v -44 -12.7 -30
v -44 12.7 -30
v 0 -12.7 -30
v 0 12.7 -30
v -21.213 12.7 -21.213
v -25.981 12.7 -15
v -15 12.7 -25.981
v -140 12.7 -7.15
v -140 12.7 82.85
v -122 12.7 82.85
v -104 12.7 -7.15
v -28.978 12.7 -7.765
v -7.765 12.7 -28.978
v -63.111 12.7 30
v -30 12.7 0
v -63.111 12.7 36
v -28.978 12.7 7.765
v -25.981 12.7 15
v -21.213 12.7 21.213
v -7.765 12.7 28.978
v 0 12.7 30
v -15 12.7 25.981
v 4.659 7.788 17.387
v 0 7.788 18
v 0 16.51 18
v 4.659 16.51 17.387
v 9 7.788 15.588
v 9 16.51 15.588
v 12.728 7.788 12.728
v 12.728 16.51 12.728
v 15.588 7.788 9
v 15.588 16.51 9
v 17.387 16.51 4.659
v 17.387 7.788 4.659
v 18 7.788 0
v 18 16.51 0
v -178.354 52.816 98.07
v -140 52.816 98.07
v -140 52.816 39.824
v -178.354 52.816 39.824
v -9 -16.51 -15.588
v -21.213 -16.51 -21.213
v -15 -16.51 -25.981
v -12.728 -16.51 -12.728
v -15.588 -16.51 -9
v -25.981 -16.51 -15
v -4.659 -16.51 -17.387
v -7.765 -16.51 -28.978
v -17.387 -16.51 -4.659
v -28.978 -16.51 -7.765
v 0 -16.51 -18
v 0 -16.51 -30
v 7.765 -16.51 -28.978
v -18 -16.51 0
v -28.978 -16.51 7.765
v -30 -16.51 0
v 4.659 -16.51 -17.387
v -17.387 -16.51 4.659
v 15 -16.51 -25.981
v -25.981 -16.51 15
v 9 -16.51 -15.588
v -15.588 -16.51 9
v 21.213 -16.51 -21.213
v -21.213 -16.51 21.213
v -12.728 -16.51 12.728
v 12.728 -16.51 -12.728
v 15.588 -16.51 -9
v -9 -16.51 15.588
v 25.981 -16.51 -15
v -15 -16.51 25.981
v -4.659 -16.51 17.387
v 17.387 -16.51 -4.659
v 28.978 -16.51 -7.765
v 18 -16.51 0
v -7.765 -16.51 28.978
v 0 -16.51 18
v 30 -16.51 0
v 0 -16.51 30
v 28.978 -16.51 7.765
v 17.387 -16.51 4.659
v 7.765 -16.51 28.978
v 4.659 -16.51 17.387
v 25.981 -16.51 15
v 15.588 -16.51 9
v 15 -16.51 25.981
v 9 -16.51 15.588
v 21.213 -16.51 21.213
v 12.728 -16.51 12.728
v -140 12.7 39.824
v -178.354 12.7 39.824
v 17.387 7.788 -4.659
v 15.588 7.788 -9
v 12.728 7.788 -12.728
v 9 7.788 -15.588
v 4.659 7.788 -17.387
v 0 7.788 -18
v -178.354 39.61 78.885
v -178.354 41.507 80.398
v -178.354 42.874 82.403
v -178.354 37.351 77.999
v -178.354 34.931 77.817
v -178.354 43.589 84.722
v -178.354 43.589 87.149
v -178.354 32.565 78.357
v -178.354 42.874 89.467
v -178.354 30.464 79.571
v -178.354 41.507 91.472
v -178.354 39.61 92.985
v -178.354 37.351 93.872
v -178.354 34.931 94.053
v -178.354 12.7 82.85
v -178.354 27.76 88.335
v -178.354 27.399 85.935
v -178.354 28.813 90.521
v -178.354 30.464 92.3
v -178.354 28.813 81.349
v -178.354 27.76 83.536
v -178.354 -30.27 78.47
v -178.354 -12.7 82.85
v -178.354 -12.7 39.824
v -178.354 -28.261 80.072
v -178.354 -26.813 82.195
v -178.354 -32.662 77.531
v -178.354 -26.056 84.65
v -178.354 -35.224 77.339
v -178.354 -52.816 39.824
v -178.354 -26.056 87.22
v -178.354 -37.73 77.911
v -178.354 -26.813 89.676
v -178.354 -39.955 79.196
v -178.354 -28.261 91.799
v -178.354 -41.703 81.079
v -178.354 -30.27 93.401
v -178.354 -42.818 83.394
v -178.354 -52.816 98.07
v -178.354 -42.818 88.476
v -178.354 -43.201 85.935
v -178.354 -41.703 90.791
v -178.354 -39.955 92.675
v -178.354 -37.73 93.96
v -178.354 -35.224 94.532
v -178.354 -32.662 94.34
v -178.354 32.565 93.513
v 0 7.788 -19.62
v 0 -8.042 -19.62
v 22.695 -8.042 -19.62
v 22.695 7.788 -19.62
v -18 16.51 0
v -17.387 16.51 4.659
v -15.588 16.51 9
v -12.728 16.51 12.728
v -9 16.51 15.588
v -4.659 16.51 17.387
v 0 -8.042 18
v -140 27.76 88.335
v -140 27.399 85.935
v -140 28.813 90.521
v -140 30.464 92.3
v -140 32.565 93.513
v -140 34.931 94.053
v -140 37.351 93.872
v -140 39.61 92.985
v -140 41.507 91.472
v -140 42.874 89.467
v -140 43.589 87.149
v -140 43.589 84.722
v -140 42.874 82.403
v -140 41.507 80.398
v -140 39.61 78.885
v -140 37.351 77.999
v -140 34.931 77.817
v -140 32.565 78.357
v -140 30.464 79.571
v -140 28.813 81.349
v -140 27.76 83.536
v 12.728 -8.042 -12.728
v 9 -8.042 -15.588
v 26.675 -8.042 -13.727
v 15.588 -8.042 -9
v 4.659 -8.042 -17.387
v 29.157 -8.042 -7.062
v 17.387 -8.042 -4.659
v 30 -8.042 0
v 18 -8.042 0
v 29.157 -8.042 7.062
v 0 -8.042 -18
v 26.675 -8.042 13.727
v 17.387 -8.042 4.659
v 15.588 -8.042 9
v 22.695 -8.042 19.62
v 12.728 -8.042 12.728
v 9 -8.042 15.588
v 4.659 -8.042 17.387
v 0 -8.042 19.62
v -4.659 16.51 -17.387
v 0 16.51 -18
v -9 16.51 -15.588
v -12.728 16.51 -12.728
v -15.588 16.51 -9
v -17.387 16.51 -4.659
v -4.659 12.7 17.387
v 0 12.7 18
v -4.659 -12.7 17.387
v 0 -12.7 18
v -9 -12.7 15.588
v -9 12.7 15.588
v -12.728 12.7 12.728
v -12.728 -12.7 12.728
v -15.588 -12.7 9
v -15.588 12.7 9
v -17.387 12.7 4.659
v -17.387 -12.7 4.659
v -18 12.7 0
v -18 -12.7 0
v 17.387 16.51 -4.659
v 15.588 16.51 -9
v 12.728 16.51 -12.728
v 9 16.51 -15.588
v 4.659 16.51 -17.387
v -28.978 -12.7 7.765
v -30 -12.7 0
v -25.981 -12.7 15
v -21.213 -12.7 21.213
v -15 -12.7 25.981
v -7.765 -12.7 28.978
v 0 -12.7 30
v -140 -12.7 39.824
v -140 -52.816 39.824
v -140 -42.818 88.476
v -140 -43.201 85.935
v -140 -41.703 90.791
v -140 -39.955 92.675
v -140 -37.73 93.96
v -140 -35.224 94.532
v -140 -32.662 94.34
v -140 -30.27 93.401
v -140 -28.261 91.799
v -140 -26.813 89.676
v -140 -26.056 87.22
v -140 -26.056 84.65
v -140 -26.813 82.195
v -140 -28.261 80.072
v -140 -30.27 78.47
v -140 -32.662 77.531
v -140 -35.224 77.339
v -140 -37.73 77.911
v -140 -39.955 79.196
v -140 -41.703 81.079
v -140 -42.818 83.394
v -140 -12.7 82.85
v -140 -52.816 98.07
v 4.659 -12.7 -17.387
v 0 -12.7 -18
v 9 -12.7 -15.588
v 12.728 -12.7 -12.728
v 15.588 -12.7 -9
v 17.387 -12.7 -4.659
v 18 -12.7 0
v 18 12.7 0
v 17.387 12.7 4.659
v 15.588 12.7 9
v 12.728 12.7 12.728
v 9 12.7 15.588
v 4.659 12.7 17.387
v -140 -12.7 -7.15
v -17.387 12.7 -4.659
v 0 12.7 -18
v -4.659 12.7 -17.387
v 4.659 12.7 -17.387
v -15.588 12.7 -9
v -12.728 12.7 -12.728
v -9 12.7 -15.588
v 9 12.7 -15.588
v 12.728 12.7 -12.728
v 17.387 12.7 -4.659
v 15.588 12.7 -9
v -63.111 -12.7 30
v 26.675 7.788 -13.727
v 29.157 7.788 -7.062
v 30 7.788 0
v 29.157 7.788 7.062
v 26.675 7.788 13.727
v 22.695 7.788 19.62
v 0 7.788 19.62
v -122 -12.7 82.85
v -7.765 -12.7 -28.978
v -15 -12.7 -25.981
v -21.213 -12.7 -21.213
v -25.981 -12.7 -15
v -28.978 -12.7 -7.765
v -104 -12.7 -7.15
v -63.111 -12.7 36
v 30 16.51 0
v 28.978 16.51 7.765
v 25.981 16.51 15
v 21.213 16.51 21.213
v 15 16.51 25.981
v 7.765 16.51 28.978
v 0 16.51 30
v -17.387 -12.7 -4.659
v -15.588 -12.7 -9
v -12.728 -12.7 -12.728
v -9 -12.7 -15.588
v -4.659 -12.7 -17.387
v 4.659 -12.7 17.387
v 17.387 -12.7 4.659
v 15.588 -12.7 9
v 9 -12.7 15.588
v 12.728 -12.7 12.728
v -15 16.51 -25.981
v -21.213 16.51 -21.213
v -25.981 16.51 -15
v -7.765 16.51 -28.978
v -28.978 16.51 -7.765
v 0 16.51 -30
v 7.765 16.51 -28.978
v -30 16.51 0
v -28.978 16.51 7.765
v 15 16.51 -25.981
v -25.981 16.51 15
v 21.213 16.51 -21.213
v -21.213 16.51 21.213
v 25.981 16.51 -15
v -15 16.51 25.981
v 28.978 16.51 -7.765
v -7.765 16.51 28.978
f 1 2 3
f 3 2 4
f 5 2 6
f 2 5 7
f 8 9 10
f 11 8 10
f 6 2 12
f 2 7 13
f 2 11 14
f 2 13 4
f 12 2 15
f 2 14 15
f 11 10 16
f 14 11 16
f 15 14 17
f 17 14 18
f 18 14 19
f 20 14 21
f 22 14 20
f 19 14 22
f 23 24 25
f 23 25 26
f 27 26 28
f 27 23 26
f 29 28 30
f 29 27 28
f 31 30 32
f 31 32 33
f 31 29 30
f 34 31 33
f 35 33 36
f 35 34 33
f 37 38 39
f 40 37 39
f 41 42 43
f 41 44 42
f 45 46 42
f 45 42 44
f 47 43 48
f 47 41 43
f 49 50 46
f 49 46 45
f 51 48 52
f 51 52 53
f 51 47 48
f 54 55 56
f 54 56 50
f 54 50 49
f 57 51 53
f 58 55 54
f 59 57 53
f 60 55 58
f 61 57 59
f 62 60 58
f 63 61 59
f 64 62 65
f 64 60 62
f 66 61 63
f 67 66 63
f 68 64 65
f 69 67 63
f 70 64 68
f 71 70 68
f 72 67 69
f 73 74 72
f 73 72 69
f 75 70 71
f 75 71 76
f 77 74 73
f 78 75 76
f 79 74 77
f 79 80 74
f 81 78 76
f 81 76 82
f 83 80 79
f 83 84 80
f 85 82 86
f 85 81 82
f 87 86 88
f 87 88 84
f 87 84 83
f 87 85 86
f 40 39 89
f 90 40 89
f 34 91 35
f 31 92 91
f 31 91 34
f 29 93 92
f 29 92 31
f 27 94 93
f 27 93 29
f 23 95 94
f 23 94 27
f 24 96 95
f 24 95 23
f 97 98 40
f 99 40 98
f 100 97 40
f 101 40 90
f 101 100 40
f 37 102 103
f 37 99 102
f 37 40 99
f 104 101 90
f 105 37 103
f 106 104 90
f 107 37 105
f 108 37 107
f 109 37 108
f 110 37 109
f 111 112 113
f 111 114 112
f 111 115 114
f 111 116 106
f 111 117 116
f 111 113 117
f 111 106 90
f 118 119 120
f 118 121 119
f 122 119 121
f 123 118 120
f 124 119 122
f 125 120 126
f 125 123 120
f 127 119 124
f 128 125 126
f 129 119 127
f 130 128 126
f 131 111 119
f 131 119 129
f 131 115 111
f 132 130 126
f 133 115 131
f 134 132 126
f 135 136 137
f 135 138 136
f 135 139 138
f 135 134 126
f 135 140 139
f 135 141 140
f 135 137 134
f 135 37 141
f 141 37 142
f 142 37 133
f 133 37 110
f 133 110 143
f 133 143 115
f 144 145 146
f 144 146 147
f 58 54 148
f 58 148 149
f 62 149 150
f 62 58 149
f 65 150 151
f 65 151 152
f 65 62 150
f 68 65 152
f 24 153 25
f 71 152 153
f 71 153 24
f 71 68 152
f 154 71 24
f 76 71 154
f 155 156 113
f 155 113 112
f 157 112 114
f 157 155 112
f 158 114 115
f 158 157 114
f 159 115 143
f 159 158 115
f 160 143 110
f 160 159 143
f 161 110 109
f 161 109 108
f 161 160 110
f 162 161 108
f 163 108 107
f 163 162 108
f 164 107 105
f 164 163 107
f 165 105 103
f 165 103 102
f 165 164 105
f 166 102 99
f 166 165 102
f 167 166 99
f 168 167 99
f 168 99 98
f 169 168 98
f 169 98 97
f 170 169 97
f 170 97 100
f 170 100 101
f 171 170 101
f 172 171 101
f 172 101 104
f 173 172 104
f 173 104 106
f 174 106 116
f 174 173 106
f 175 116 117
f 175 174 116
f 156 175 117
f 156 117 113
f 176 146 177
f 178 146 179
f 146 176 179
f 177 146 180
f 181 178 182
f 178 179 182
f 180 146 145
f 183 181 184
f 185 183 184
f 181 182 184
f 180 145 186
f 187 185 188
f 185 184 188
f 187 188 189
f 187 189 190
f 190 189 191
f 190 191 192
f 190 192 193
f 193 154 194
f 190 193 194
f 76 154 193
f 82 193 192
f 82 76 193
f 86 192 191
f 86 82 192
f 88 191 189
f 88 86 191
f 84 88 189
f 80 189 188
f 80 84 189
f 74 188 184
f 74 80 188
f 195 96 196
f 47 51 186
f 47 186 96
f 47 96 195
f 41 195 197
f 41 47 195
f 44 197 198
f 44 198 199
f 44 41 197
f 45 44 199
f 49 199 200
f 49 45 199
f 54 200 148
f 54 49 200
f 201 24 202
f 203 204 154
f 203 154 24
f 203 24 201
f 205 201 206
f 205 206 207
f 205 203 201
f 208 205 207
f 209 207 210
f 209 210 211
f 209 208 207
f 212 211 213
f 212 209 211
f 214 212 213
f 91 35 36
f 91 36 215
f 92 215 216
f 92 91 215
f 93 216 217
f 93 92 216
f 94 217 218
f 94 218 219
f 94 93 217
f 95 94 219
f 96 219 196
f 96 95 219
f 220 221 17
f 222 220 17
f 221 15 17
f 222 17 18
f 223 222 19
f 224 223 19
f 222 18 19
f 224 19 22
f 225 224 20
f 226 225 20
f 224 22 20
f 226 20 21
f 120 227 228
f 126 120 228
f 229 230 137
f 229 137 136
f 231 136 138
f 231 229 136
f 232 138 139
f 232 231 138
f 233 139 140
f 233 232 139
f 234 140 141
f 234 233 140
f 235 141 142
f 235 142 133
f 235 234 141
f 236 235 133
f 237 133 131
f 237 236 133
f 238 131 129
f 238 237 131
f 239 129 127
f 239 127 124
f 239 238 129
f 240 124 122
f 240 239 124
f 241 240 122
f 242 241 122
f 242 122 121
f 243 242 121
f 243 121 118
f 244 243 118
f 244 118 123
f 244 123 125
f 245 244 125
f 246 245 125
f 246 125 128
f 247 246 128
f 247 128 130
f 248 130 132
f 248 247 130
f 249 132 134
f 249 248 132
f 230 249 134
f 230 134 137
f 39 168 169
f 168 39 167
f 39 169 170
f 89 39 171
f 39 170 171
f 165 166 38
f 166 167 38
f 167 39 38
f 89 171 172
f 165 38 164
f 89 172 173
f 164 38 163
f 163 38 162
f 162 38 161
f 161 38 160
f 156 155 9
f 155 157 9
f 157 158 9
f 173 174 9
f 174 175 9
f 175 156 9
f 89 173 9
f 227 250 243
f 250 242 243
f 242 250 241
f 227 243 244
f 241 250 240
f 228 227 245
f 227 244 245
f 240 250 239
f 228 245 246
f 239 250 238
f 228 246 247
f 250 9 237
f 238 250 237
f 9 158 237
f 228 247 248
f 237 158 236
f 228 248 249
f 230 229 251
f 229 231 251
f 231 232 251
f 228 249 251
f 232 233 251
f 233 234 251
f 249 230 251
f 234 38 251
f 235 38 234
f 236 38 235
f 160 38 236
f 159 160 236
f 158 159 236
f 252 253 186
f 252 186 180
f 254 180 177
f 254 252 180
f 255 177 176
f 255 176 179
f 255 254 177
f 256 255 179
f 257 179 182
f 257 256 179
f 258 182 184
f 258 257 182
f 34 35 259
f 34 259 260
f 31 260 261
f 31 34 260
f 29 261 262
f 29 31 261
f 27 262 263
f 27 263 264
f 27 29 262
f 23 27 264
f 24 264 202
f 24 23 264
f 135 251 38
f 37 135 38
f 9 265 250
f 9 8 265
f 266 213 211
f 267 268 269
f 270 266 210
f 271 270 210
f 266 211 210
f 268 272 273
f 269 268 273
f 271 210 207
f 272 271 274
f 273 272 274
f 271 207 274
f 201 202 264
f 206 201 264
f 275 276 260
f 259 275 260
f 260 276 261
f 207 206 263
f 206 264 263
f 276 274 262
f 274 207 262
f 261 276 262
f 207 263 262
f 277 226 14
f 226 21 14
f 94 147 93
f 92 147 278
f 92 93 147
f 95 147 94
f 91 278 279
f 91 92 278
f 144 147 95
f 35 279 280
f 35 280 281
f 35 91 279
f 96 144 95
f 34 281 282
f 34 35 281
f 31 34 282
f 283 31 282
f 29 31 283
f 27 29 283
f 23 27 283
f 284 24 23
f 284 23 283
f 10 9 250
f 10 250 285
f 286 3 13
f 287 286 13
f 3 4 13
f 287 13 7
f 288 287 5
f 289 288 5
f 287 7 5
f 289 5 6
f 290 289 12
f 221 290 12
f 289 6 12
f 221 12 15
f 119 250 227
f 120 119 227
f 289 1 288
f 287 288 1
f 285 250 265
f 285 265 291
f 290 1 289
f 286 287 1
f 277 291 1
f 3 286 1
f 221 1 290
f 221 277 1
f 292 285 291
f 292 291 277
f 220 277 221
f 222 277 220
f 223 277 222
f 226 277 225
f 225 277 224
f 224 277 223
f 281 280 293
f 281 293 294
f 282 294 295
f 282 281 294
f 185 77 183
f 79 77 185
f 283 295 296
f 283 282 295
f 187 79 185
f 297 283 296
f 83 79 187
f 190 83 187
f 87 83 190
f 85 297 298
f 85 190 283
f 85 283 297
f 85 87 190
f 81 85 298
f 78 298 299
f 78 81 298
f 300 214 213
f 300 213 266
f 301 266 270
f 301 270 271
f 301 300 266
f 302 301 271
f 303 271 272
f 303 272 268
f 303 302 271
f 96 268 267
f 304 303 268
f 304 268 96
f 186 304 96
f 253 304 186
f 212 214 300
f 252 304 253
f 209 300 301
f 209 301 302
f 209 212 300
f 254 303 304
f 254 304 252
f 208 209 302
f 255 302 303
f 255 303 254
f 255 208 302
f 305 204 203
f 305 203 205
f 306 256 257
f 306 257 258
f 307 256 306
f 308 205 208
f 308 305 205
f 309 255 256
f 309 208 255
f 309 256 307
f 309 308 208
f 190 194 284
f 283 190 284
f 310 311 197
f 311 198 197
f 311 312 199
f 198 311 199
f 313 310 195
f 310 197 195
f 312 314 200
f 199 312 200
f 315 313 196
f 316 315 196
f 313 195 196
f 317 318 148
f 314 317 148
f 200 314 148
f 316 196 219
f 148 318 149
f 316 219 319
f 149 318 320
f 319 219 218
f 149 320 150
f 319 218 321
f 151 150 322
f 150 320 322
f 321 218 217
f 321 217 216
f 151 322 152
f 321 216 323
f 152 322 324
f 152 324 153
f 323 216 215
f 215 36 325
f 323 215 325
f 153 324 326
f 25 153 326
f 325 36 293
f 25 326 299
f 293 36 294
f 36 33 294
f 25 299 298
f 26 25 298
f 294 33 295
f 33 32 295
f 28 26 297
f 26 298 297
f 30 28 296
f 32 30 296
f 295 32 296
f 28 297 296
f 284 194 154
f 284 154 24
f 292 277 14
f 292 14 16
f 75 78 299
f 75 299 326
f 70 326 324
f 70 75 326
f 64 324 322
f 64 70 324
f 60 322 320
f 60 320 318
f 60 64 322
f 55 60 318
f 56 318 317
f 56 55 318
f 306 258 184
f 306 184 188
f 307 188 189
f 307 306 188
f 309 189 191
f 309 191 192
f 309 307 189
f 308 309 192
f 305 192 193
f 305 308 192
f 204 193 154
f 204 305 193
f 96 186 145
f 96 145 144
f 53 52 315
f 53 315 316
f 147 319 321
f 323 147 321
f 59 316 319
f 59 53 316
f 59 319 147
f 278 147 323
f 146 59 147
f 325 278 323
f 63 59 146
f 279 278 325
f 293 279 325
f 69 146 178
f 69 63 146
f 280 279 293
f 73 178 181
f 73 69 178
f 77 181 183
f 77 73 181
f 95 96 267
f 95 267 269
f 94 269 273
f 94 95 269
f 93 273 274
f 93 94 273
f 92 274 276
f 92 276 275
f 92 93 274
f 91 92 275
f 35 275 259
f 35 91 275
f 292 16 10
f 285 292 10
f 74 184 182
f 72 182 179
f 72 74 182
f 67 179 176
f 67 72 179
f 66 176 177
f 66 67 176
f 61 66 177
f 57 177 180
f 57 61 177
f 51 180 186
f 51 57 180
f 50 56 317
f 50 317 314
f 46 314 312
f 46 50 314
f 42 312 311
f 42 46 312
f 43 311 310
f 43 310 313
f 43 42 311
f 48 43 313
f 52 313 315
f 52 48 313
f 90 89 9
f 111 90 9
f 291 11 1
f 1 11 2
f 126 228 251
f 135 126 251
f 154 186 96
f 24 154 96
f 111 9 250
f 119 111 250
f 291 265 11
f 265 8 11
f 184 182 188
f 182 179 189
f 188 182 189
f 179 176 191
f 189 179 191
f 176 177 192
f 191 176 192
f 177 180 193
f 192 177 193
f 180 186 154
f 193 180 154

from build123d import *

# Parameters (mm, degrees)
F0_W     = 18
F0_H     = 90
F1_DEPTH = 12.7
F2_DEPTH = 16.51
F3_R     = 8.14073
F3_R_2   = 8.620427
F4_DEPTH = 38.354
F5_W     = 15.829529
F5_H     = 39.240476
F6_DEPTH = 56.896


with BuildPart() as f1:
    # F0 (on Front) → F1 (new body, symmetric)
    with BuildSketch(Plane.XZ):
        with Locations((-131, 37.849821)):
            Rectangle(F0_W, F0_H)
        Polygon((-104, -7.150179), (-44, -30), (-44, 0), (-44, 18), (-104, 18), align=None)
        with BuildLine():
            Line((0, 0), (0, 18))
            ThreePointArc((0, 18), (-12.727922, 12.727922), (-18, 0))
            Line((-18, 0), (0, 0))
        make_face()
        with BuildLine():
            Line((0, 0), (18, 0))
            ThreePointArc((18, 0), (12.727922, 12.727922), (0, 18))
            Line((0, 18), (0, 0))
        make_face()
        with BuildLine():
            ThreePointArc((0, -18), (12.727922, -12.727922), (18, 0))
            Line((18, 0), (0, 0))
            Line((0, 0), (0, -18))
        make_face()
        with BuildLine():
            ThreePointArc((-18, 0), (-12.727922, -12.727922), (0, -18))
            Line((0, -18), (0, 0))
            Line((0, 0), (-18, 0))
        make_face()
        with BuildLine():
            Line((-44, -30), (0, -30))
            ThreePointArc((0, -30), (-21.213203, -21.213203), (-30, 0))
            Line((-30, 0), (-44, 0))
            Line((-44, 0), (-44, -30))
        make_face()
        with BuildLine():
            ThreePointArc((-30, 0), (-21.213203, 21.213203), (0, 30))
            Line((0, 30), (-63.111477, 30))
            Line((-63.111477, 30), (-63.111477, 36))
            Line((-63.111477, 36), (-122, 82.849821))
            Line((-122, 82.849821), (-122, -7.150179))
            Line((-122, -7.150179), (-104, -7.150179))
            Line((-104, -7.150179), (-104, 18))
            Line((-104, 18), (-44, 18))
            Line((-44, 18), (-44, 0))
            Line((-44, 0), (-30, 0))
        make_face()
    extrude(amount=F1_DEPTH, both=True)


with BuildPart() as f2:
    # F0 (on Front) → F2 (new body, symmetric)
    with BuildSketch(Plane.XZ):
        with BuildLine():
            Line((18, 0), (30, 0))
            ThreePointArc((30, 0), (21.213203, 21.213203), (0, 30))
            Line((0, 30), (0, 18))
            ThreePointArc((0, 18), (12.727922, 12.727922), (18, 0))
        make_face()
        with BuildLine():
            Line((0, 18), (0, 30))
            ThreePointArc((0, 30), (-21.213203, 21.213203), (-30, 0))
            Line((-30, 0), (-18, 0))
            ThreePointArc((-18, 0), (-12.727922, 12.727922), (0, 18))
        make_face()
        with BuildLine():
            ThreePointArc((-30, 0), (-21.213203, -21.213203), (0, -30))
            Line((0, -30), (0, -18))
            ThreePointArc((0, -18), (-12.727922, -12.727922), (-18, 0))
            Line((-18, 0), (-30, 0))
        make_face()
        with BuildLine():
            ThreePointArc((0, -30), (21.213203, -21.213203), (30, 0))
            Line((30, 0), (18, 0))
            ThreePointArc((18, 0), (12.727922, -12.727922), (0, -18))
            Line((0, -18), (0, -30))
        make_face()
    extrude(amount=F2_DEPTH, both=True)


with BuildPart() as f4:
    # F3 (on face) → F4 (new body)
    with BuildSketch(Plane(origin=(-140, 0, 0), x_dir=(0, -1, 0), z_dir=(-1, 0, 0))):
        Polygon((52.815661, 98.069571), (-52.815661, 98.069571), (-52.815661, 39.824255), (-12.7, 39.824255), (-12.7, 82.849821), (12.7, 82.849821), (12.7, 39.824255), (52.815661, 39.824255), align=None)
        with Locations((-35.539515, 85.93525)):
            Circle(F3_R, mode=Mode.SUBTRACT)
        with Locations((34.580109, 85.93525)):
            Circle(F3_R_2, mode=Mode.SUBTRACT)
    extrude(amount=F4_DEPTH)


with BuildPart() as f6_tool:
    # F5 (on Right) → F6 (new body)
    with BuildSketch(Plane.YZ):
        with Locations((-0.126766, 0)):
            Rectangle(F5_W, F5_H)
    extrude(amount=F6_DEPTH)


with BuildPart() as f1_1:
    add(f1.part)

    # F6: cut by f6_tool
    add(f6_tool.part, mode=Mode.SUBTRACT)


with BuildPart() as f2_1:
    add(f2.part)

    # F6: cut by f6_tool
    add(f6_tool.part, mode=Mode.SUBTRACT)


solid = Compound([f4.part, f1_1.part, f2_1.part])
